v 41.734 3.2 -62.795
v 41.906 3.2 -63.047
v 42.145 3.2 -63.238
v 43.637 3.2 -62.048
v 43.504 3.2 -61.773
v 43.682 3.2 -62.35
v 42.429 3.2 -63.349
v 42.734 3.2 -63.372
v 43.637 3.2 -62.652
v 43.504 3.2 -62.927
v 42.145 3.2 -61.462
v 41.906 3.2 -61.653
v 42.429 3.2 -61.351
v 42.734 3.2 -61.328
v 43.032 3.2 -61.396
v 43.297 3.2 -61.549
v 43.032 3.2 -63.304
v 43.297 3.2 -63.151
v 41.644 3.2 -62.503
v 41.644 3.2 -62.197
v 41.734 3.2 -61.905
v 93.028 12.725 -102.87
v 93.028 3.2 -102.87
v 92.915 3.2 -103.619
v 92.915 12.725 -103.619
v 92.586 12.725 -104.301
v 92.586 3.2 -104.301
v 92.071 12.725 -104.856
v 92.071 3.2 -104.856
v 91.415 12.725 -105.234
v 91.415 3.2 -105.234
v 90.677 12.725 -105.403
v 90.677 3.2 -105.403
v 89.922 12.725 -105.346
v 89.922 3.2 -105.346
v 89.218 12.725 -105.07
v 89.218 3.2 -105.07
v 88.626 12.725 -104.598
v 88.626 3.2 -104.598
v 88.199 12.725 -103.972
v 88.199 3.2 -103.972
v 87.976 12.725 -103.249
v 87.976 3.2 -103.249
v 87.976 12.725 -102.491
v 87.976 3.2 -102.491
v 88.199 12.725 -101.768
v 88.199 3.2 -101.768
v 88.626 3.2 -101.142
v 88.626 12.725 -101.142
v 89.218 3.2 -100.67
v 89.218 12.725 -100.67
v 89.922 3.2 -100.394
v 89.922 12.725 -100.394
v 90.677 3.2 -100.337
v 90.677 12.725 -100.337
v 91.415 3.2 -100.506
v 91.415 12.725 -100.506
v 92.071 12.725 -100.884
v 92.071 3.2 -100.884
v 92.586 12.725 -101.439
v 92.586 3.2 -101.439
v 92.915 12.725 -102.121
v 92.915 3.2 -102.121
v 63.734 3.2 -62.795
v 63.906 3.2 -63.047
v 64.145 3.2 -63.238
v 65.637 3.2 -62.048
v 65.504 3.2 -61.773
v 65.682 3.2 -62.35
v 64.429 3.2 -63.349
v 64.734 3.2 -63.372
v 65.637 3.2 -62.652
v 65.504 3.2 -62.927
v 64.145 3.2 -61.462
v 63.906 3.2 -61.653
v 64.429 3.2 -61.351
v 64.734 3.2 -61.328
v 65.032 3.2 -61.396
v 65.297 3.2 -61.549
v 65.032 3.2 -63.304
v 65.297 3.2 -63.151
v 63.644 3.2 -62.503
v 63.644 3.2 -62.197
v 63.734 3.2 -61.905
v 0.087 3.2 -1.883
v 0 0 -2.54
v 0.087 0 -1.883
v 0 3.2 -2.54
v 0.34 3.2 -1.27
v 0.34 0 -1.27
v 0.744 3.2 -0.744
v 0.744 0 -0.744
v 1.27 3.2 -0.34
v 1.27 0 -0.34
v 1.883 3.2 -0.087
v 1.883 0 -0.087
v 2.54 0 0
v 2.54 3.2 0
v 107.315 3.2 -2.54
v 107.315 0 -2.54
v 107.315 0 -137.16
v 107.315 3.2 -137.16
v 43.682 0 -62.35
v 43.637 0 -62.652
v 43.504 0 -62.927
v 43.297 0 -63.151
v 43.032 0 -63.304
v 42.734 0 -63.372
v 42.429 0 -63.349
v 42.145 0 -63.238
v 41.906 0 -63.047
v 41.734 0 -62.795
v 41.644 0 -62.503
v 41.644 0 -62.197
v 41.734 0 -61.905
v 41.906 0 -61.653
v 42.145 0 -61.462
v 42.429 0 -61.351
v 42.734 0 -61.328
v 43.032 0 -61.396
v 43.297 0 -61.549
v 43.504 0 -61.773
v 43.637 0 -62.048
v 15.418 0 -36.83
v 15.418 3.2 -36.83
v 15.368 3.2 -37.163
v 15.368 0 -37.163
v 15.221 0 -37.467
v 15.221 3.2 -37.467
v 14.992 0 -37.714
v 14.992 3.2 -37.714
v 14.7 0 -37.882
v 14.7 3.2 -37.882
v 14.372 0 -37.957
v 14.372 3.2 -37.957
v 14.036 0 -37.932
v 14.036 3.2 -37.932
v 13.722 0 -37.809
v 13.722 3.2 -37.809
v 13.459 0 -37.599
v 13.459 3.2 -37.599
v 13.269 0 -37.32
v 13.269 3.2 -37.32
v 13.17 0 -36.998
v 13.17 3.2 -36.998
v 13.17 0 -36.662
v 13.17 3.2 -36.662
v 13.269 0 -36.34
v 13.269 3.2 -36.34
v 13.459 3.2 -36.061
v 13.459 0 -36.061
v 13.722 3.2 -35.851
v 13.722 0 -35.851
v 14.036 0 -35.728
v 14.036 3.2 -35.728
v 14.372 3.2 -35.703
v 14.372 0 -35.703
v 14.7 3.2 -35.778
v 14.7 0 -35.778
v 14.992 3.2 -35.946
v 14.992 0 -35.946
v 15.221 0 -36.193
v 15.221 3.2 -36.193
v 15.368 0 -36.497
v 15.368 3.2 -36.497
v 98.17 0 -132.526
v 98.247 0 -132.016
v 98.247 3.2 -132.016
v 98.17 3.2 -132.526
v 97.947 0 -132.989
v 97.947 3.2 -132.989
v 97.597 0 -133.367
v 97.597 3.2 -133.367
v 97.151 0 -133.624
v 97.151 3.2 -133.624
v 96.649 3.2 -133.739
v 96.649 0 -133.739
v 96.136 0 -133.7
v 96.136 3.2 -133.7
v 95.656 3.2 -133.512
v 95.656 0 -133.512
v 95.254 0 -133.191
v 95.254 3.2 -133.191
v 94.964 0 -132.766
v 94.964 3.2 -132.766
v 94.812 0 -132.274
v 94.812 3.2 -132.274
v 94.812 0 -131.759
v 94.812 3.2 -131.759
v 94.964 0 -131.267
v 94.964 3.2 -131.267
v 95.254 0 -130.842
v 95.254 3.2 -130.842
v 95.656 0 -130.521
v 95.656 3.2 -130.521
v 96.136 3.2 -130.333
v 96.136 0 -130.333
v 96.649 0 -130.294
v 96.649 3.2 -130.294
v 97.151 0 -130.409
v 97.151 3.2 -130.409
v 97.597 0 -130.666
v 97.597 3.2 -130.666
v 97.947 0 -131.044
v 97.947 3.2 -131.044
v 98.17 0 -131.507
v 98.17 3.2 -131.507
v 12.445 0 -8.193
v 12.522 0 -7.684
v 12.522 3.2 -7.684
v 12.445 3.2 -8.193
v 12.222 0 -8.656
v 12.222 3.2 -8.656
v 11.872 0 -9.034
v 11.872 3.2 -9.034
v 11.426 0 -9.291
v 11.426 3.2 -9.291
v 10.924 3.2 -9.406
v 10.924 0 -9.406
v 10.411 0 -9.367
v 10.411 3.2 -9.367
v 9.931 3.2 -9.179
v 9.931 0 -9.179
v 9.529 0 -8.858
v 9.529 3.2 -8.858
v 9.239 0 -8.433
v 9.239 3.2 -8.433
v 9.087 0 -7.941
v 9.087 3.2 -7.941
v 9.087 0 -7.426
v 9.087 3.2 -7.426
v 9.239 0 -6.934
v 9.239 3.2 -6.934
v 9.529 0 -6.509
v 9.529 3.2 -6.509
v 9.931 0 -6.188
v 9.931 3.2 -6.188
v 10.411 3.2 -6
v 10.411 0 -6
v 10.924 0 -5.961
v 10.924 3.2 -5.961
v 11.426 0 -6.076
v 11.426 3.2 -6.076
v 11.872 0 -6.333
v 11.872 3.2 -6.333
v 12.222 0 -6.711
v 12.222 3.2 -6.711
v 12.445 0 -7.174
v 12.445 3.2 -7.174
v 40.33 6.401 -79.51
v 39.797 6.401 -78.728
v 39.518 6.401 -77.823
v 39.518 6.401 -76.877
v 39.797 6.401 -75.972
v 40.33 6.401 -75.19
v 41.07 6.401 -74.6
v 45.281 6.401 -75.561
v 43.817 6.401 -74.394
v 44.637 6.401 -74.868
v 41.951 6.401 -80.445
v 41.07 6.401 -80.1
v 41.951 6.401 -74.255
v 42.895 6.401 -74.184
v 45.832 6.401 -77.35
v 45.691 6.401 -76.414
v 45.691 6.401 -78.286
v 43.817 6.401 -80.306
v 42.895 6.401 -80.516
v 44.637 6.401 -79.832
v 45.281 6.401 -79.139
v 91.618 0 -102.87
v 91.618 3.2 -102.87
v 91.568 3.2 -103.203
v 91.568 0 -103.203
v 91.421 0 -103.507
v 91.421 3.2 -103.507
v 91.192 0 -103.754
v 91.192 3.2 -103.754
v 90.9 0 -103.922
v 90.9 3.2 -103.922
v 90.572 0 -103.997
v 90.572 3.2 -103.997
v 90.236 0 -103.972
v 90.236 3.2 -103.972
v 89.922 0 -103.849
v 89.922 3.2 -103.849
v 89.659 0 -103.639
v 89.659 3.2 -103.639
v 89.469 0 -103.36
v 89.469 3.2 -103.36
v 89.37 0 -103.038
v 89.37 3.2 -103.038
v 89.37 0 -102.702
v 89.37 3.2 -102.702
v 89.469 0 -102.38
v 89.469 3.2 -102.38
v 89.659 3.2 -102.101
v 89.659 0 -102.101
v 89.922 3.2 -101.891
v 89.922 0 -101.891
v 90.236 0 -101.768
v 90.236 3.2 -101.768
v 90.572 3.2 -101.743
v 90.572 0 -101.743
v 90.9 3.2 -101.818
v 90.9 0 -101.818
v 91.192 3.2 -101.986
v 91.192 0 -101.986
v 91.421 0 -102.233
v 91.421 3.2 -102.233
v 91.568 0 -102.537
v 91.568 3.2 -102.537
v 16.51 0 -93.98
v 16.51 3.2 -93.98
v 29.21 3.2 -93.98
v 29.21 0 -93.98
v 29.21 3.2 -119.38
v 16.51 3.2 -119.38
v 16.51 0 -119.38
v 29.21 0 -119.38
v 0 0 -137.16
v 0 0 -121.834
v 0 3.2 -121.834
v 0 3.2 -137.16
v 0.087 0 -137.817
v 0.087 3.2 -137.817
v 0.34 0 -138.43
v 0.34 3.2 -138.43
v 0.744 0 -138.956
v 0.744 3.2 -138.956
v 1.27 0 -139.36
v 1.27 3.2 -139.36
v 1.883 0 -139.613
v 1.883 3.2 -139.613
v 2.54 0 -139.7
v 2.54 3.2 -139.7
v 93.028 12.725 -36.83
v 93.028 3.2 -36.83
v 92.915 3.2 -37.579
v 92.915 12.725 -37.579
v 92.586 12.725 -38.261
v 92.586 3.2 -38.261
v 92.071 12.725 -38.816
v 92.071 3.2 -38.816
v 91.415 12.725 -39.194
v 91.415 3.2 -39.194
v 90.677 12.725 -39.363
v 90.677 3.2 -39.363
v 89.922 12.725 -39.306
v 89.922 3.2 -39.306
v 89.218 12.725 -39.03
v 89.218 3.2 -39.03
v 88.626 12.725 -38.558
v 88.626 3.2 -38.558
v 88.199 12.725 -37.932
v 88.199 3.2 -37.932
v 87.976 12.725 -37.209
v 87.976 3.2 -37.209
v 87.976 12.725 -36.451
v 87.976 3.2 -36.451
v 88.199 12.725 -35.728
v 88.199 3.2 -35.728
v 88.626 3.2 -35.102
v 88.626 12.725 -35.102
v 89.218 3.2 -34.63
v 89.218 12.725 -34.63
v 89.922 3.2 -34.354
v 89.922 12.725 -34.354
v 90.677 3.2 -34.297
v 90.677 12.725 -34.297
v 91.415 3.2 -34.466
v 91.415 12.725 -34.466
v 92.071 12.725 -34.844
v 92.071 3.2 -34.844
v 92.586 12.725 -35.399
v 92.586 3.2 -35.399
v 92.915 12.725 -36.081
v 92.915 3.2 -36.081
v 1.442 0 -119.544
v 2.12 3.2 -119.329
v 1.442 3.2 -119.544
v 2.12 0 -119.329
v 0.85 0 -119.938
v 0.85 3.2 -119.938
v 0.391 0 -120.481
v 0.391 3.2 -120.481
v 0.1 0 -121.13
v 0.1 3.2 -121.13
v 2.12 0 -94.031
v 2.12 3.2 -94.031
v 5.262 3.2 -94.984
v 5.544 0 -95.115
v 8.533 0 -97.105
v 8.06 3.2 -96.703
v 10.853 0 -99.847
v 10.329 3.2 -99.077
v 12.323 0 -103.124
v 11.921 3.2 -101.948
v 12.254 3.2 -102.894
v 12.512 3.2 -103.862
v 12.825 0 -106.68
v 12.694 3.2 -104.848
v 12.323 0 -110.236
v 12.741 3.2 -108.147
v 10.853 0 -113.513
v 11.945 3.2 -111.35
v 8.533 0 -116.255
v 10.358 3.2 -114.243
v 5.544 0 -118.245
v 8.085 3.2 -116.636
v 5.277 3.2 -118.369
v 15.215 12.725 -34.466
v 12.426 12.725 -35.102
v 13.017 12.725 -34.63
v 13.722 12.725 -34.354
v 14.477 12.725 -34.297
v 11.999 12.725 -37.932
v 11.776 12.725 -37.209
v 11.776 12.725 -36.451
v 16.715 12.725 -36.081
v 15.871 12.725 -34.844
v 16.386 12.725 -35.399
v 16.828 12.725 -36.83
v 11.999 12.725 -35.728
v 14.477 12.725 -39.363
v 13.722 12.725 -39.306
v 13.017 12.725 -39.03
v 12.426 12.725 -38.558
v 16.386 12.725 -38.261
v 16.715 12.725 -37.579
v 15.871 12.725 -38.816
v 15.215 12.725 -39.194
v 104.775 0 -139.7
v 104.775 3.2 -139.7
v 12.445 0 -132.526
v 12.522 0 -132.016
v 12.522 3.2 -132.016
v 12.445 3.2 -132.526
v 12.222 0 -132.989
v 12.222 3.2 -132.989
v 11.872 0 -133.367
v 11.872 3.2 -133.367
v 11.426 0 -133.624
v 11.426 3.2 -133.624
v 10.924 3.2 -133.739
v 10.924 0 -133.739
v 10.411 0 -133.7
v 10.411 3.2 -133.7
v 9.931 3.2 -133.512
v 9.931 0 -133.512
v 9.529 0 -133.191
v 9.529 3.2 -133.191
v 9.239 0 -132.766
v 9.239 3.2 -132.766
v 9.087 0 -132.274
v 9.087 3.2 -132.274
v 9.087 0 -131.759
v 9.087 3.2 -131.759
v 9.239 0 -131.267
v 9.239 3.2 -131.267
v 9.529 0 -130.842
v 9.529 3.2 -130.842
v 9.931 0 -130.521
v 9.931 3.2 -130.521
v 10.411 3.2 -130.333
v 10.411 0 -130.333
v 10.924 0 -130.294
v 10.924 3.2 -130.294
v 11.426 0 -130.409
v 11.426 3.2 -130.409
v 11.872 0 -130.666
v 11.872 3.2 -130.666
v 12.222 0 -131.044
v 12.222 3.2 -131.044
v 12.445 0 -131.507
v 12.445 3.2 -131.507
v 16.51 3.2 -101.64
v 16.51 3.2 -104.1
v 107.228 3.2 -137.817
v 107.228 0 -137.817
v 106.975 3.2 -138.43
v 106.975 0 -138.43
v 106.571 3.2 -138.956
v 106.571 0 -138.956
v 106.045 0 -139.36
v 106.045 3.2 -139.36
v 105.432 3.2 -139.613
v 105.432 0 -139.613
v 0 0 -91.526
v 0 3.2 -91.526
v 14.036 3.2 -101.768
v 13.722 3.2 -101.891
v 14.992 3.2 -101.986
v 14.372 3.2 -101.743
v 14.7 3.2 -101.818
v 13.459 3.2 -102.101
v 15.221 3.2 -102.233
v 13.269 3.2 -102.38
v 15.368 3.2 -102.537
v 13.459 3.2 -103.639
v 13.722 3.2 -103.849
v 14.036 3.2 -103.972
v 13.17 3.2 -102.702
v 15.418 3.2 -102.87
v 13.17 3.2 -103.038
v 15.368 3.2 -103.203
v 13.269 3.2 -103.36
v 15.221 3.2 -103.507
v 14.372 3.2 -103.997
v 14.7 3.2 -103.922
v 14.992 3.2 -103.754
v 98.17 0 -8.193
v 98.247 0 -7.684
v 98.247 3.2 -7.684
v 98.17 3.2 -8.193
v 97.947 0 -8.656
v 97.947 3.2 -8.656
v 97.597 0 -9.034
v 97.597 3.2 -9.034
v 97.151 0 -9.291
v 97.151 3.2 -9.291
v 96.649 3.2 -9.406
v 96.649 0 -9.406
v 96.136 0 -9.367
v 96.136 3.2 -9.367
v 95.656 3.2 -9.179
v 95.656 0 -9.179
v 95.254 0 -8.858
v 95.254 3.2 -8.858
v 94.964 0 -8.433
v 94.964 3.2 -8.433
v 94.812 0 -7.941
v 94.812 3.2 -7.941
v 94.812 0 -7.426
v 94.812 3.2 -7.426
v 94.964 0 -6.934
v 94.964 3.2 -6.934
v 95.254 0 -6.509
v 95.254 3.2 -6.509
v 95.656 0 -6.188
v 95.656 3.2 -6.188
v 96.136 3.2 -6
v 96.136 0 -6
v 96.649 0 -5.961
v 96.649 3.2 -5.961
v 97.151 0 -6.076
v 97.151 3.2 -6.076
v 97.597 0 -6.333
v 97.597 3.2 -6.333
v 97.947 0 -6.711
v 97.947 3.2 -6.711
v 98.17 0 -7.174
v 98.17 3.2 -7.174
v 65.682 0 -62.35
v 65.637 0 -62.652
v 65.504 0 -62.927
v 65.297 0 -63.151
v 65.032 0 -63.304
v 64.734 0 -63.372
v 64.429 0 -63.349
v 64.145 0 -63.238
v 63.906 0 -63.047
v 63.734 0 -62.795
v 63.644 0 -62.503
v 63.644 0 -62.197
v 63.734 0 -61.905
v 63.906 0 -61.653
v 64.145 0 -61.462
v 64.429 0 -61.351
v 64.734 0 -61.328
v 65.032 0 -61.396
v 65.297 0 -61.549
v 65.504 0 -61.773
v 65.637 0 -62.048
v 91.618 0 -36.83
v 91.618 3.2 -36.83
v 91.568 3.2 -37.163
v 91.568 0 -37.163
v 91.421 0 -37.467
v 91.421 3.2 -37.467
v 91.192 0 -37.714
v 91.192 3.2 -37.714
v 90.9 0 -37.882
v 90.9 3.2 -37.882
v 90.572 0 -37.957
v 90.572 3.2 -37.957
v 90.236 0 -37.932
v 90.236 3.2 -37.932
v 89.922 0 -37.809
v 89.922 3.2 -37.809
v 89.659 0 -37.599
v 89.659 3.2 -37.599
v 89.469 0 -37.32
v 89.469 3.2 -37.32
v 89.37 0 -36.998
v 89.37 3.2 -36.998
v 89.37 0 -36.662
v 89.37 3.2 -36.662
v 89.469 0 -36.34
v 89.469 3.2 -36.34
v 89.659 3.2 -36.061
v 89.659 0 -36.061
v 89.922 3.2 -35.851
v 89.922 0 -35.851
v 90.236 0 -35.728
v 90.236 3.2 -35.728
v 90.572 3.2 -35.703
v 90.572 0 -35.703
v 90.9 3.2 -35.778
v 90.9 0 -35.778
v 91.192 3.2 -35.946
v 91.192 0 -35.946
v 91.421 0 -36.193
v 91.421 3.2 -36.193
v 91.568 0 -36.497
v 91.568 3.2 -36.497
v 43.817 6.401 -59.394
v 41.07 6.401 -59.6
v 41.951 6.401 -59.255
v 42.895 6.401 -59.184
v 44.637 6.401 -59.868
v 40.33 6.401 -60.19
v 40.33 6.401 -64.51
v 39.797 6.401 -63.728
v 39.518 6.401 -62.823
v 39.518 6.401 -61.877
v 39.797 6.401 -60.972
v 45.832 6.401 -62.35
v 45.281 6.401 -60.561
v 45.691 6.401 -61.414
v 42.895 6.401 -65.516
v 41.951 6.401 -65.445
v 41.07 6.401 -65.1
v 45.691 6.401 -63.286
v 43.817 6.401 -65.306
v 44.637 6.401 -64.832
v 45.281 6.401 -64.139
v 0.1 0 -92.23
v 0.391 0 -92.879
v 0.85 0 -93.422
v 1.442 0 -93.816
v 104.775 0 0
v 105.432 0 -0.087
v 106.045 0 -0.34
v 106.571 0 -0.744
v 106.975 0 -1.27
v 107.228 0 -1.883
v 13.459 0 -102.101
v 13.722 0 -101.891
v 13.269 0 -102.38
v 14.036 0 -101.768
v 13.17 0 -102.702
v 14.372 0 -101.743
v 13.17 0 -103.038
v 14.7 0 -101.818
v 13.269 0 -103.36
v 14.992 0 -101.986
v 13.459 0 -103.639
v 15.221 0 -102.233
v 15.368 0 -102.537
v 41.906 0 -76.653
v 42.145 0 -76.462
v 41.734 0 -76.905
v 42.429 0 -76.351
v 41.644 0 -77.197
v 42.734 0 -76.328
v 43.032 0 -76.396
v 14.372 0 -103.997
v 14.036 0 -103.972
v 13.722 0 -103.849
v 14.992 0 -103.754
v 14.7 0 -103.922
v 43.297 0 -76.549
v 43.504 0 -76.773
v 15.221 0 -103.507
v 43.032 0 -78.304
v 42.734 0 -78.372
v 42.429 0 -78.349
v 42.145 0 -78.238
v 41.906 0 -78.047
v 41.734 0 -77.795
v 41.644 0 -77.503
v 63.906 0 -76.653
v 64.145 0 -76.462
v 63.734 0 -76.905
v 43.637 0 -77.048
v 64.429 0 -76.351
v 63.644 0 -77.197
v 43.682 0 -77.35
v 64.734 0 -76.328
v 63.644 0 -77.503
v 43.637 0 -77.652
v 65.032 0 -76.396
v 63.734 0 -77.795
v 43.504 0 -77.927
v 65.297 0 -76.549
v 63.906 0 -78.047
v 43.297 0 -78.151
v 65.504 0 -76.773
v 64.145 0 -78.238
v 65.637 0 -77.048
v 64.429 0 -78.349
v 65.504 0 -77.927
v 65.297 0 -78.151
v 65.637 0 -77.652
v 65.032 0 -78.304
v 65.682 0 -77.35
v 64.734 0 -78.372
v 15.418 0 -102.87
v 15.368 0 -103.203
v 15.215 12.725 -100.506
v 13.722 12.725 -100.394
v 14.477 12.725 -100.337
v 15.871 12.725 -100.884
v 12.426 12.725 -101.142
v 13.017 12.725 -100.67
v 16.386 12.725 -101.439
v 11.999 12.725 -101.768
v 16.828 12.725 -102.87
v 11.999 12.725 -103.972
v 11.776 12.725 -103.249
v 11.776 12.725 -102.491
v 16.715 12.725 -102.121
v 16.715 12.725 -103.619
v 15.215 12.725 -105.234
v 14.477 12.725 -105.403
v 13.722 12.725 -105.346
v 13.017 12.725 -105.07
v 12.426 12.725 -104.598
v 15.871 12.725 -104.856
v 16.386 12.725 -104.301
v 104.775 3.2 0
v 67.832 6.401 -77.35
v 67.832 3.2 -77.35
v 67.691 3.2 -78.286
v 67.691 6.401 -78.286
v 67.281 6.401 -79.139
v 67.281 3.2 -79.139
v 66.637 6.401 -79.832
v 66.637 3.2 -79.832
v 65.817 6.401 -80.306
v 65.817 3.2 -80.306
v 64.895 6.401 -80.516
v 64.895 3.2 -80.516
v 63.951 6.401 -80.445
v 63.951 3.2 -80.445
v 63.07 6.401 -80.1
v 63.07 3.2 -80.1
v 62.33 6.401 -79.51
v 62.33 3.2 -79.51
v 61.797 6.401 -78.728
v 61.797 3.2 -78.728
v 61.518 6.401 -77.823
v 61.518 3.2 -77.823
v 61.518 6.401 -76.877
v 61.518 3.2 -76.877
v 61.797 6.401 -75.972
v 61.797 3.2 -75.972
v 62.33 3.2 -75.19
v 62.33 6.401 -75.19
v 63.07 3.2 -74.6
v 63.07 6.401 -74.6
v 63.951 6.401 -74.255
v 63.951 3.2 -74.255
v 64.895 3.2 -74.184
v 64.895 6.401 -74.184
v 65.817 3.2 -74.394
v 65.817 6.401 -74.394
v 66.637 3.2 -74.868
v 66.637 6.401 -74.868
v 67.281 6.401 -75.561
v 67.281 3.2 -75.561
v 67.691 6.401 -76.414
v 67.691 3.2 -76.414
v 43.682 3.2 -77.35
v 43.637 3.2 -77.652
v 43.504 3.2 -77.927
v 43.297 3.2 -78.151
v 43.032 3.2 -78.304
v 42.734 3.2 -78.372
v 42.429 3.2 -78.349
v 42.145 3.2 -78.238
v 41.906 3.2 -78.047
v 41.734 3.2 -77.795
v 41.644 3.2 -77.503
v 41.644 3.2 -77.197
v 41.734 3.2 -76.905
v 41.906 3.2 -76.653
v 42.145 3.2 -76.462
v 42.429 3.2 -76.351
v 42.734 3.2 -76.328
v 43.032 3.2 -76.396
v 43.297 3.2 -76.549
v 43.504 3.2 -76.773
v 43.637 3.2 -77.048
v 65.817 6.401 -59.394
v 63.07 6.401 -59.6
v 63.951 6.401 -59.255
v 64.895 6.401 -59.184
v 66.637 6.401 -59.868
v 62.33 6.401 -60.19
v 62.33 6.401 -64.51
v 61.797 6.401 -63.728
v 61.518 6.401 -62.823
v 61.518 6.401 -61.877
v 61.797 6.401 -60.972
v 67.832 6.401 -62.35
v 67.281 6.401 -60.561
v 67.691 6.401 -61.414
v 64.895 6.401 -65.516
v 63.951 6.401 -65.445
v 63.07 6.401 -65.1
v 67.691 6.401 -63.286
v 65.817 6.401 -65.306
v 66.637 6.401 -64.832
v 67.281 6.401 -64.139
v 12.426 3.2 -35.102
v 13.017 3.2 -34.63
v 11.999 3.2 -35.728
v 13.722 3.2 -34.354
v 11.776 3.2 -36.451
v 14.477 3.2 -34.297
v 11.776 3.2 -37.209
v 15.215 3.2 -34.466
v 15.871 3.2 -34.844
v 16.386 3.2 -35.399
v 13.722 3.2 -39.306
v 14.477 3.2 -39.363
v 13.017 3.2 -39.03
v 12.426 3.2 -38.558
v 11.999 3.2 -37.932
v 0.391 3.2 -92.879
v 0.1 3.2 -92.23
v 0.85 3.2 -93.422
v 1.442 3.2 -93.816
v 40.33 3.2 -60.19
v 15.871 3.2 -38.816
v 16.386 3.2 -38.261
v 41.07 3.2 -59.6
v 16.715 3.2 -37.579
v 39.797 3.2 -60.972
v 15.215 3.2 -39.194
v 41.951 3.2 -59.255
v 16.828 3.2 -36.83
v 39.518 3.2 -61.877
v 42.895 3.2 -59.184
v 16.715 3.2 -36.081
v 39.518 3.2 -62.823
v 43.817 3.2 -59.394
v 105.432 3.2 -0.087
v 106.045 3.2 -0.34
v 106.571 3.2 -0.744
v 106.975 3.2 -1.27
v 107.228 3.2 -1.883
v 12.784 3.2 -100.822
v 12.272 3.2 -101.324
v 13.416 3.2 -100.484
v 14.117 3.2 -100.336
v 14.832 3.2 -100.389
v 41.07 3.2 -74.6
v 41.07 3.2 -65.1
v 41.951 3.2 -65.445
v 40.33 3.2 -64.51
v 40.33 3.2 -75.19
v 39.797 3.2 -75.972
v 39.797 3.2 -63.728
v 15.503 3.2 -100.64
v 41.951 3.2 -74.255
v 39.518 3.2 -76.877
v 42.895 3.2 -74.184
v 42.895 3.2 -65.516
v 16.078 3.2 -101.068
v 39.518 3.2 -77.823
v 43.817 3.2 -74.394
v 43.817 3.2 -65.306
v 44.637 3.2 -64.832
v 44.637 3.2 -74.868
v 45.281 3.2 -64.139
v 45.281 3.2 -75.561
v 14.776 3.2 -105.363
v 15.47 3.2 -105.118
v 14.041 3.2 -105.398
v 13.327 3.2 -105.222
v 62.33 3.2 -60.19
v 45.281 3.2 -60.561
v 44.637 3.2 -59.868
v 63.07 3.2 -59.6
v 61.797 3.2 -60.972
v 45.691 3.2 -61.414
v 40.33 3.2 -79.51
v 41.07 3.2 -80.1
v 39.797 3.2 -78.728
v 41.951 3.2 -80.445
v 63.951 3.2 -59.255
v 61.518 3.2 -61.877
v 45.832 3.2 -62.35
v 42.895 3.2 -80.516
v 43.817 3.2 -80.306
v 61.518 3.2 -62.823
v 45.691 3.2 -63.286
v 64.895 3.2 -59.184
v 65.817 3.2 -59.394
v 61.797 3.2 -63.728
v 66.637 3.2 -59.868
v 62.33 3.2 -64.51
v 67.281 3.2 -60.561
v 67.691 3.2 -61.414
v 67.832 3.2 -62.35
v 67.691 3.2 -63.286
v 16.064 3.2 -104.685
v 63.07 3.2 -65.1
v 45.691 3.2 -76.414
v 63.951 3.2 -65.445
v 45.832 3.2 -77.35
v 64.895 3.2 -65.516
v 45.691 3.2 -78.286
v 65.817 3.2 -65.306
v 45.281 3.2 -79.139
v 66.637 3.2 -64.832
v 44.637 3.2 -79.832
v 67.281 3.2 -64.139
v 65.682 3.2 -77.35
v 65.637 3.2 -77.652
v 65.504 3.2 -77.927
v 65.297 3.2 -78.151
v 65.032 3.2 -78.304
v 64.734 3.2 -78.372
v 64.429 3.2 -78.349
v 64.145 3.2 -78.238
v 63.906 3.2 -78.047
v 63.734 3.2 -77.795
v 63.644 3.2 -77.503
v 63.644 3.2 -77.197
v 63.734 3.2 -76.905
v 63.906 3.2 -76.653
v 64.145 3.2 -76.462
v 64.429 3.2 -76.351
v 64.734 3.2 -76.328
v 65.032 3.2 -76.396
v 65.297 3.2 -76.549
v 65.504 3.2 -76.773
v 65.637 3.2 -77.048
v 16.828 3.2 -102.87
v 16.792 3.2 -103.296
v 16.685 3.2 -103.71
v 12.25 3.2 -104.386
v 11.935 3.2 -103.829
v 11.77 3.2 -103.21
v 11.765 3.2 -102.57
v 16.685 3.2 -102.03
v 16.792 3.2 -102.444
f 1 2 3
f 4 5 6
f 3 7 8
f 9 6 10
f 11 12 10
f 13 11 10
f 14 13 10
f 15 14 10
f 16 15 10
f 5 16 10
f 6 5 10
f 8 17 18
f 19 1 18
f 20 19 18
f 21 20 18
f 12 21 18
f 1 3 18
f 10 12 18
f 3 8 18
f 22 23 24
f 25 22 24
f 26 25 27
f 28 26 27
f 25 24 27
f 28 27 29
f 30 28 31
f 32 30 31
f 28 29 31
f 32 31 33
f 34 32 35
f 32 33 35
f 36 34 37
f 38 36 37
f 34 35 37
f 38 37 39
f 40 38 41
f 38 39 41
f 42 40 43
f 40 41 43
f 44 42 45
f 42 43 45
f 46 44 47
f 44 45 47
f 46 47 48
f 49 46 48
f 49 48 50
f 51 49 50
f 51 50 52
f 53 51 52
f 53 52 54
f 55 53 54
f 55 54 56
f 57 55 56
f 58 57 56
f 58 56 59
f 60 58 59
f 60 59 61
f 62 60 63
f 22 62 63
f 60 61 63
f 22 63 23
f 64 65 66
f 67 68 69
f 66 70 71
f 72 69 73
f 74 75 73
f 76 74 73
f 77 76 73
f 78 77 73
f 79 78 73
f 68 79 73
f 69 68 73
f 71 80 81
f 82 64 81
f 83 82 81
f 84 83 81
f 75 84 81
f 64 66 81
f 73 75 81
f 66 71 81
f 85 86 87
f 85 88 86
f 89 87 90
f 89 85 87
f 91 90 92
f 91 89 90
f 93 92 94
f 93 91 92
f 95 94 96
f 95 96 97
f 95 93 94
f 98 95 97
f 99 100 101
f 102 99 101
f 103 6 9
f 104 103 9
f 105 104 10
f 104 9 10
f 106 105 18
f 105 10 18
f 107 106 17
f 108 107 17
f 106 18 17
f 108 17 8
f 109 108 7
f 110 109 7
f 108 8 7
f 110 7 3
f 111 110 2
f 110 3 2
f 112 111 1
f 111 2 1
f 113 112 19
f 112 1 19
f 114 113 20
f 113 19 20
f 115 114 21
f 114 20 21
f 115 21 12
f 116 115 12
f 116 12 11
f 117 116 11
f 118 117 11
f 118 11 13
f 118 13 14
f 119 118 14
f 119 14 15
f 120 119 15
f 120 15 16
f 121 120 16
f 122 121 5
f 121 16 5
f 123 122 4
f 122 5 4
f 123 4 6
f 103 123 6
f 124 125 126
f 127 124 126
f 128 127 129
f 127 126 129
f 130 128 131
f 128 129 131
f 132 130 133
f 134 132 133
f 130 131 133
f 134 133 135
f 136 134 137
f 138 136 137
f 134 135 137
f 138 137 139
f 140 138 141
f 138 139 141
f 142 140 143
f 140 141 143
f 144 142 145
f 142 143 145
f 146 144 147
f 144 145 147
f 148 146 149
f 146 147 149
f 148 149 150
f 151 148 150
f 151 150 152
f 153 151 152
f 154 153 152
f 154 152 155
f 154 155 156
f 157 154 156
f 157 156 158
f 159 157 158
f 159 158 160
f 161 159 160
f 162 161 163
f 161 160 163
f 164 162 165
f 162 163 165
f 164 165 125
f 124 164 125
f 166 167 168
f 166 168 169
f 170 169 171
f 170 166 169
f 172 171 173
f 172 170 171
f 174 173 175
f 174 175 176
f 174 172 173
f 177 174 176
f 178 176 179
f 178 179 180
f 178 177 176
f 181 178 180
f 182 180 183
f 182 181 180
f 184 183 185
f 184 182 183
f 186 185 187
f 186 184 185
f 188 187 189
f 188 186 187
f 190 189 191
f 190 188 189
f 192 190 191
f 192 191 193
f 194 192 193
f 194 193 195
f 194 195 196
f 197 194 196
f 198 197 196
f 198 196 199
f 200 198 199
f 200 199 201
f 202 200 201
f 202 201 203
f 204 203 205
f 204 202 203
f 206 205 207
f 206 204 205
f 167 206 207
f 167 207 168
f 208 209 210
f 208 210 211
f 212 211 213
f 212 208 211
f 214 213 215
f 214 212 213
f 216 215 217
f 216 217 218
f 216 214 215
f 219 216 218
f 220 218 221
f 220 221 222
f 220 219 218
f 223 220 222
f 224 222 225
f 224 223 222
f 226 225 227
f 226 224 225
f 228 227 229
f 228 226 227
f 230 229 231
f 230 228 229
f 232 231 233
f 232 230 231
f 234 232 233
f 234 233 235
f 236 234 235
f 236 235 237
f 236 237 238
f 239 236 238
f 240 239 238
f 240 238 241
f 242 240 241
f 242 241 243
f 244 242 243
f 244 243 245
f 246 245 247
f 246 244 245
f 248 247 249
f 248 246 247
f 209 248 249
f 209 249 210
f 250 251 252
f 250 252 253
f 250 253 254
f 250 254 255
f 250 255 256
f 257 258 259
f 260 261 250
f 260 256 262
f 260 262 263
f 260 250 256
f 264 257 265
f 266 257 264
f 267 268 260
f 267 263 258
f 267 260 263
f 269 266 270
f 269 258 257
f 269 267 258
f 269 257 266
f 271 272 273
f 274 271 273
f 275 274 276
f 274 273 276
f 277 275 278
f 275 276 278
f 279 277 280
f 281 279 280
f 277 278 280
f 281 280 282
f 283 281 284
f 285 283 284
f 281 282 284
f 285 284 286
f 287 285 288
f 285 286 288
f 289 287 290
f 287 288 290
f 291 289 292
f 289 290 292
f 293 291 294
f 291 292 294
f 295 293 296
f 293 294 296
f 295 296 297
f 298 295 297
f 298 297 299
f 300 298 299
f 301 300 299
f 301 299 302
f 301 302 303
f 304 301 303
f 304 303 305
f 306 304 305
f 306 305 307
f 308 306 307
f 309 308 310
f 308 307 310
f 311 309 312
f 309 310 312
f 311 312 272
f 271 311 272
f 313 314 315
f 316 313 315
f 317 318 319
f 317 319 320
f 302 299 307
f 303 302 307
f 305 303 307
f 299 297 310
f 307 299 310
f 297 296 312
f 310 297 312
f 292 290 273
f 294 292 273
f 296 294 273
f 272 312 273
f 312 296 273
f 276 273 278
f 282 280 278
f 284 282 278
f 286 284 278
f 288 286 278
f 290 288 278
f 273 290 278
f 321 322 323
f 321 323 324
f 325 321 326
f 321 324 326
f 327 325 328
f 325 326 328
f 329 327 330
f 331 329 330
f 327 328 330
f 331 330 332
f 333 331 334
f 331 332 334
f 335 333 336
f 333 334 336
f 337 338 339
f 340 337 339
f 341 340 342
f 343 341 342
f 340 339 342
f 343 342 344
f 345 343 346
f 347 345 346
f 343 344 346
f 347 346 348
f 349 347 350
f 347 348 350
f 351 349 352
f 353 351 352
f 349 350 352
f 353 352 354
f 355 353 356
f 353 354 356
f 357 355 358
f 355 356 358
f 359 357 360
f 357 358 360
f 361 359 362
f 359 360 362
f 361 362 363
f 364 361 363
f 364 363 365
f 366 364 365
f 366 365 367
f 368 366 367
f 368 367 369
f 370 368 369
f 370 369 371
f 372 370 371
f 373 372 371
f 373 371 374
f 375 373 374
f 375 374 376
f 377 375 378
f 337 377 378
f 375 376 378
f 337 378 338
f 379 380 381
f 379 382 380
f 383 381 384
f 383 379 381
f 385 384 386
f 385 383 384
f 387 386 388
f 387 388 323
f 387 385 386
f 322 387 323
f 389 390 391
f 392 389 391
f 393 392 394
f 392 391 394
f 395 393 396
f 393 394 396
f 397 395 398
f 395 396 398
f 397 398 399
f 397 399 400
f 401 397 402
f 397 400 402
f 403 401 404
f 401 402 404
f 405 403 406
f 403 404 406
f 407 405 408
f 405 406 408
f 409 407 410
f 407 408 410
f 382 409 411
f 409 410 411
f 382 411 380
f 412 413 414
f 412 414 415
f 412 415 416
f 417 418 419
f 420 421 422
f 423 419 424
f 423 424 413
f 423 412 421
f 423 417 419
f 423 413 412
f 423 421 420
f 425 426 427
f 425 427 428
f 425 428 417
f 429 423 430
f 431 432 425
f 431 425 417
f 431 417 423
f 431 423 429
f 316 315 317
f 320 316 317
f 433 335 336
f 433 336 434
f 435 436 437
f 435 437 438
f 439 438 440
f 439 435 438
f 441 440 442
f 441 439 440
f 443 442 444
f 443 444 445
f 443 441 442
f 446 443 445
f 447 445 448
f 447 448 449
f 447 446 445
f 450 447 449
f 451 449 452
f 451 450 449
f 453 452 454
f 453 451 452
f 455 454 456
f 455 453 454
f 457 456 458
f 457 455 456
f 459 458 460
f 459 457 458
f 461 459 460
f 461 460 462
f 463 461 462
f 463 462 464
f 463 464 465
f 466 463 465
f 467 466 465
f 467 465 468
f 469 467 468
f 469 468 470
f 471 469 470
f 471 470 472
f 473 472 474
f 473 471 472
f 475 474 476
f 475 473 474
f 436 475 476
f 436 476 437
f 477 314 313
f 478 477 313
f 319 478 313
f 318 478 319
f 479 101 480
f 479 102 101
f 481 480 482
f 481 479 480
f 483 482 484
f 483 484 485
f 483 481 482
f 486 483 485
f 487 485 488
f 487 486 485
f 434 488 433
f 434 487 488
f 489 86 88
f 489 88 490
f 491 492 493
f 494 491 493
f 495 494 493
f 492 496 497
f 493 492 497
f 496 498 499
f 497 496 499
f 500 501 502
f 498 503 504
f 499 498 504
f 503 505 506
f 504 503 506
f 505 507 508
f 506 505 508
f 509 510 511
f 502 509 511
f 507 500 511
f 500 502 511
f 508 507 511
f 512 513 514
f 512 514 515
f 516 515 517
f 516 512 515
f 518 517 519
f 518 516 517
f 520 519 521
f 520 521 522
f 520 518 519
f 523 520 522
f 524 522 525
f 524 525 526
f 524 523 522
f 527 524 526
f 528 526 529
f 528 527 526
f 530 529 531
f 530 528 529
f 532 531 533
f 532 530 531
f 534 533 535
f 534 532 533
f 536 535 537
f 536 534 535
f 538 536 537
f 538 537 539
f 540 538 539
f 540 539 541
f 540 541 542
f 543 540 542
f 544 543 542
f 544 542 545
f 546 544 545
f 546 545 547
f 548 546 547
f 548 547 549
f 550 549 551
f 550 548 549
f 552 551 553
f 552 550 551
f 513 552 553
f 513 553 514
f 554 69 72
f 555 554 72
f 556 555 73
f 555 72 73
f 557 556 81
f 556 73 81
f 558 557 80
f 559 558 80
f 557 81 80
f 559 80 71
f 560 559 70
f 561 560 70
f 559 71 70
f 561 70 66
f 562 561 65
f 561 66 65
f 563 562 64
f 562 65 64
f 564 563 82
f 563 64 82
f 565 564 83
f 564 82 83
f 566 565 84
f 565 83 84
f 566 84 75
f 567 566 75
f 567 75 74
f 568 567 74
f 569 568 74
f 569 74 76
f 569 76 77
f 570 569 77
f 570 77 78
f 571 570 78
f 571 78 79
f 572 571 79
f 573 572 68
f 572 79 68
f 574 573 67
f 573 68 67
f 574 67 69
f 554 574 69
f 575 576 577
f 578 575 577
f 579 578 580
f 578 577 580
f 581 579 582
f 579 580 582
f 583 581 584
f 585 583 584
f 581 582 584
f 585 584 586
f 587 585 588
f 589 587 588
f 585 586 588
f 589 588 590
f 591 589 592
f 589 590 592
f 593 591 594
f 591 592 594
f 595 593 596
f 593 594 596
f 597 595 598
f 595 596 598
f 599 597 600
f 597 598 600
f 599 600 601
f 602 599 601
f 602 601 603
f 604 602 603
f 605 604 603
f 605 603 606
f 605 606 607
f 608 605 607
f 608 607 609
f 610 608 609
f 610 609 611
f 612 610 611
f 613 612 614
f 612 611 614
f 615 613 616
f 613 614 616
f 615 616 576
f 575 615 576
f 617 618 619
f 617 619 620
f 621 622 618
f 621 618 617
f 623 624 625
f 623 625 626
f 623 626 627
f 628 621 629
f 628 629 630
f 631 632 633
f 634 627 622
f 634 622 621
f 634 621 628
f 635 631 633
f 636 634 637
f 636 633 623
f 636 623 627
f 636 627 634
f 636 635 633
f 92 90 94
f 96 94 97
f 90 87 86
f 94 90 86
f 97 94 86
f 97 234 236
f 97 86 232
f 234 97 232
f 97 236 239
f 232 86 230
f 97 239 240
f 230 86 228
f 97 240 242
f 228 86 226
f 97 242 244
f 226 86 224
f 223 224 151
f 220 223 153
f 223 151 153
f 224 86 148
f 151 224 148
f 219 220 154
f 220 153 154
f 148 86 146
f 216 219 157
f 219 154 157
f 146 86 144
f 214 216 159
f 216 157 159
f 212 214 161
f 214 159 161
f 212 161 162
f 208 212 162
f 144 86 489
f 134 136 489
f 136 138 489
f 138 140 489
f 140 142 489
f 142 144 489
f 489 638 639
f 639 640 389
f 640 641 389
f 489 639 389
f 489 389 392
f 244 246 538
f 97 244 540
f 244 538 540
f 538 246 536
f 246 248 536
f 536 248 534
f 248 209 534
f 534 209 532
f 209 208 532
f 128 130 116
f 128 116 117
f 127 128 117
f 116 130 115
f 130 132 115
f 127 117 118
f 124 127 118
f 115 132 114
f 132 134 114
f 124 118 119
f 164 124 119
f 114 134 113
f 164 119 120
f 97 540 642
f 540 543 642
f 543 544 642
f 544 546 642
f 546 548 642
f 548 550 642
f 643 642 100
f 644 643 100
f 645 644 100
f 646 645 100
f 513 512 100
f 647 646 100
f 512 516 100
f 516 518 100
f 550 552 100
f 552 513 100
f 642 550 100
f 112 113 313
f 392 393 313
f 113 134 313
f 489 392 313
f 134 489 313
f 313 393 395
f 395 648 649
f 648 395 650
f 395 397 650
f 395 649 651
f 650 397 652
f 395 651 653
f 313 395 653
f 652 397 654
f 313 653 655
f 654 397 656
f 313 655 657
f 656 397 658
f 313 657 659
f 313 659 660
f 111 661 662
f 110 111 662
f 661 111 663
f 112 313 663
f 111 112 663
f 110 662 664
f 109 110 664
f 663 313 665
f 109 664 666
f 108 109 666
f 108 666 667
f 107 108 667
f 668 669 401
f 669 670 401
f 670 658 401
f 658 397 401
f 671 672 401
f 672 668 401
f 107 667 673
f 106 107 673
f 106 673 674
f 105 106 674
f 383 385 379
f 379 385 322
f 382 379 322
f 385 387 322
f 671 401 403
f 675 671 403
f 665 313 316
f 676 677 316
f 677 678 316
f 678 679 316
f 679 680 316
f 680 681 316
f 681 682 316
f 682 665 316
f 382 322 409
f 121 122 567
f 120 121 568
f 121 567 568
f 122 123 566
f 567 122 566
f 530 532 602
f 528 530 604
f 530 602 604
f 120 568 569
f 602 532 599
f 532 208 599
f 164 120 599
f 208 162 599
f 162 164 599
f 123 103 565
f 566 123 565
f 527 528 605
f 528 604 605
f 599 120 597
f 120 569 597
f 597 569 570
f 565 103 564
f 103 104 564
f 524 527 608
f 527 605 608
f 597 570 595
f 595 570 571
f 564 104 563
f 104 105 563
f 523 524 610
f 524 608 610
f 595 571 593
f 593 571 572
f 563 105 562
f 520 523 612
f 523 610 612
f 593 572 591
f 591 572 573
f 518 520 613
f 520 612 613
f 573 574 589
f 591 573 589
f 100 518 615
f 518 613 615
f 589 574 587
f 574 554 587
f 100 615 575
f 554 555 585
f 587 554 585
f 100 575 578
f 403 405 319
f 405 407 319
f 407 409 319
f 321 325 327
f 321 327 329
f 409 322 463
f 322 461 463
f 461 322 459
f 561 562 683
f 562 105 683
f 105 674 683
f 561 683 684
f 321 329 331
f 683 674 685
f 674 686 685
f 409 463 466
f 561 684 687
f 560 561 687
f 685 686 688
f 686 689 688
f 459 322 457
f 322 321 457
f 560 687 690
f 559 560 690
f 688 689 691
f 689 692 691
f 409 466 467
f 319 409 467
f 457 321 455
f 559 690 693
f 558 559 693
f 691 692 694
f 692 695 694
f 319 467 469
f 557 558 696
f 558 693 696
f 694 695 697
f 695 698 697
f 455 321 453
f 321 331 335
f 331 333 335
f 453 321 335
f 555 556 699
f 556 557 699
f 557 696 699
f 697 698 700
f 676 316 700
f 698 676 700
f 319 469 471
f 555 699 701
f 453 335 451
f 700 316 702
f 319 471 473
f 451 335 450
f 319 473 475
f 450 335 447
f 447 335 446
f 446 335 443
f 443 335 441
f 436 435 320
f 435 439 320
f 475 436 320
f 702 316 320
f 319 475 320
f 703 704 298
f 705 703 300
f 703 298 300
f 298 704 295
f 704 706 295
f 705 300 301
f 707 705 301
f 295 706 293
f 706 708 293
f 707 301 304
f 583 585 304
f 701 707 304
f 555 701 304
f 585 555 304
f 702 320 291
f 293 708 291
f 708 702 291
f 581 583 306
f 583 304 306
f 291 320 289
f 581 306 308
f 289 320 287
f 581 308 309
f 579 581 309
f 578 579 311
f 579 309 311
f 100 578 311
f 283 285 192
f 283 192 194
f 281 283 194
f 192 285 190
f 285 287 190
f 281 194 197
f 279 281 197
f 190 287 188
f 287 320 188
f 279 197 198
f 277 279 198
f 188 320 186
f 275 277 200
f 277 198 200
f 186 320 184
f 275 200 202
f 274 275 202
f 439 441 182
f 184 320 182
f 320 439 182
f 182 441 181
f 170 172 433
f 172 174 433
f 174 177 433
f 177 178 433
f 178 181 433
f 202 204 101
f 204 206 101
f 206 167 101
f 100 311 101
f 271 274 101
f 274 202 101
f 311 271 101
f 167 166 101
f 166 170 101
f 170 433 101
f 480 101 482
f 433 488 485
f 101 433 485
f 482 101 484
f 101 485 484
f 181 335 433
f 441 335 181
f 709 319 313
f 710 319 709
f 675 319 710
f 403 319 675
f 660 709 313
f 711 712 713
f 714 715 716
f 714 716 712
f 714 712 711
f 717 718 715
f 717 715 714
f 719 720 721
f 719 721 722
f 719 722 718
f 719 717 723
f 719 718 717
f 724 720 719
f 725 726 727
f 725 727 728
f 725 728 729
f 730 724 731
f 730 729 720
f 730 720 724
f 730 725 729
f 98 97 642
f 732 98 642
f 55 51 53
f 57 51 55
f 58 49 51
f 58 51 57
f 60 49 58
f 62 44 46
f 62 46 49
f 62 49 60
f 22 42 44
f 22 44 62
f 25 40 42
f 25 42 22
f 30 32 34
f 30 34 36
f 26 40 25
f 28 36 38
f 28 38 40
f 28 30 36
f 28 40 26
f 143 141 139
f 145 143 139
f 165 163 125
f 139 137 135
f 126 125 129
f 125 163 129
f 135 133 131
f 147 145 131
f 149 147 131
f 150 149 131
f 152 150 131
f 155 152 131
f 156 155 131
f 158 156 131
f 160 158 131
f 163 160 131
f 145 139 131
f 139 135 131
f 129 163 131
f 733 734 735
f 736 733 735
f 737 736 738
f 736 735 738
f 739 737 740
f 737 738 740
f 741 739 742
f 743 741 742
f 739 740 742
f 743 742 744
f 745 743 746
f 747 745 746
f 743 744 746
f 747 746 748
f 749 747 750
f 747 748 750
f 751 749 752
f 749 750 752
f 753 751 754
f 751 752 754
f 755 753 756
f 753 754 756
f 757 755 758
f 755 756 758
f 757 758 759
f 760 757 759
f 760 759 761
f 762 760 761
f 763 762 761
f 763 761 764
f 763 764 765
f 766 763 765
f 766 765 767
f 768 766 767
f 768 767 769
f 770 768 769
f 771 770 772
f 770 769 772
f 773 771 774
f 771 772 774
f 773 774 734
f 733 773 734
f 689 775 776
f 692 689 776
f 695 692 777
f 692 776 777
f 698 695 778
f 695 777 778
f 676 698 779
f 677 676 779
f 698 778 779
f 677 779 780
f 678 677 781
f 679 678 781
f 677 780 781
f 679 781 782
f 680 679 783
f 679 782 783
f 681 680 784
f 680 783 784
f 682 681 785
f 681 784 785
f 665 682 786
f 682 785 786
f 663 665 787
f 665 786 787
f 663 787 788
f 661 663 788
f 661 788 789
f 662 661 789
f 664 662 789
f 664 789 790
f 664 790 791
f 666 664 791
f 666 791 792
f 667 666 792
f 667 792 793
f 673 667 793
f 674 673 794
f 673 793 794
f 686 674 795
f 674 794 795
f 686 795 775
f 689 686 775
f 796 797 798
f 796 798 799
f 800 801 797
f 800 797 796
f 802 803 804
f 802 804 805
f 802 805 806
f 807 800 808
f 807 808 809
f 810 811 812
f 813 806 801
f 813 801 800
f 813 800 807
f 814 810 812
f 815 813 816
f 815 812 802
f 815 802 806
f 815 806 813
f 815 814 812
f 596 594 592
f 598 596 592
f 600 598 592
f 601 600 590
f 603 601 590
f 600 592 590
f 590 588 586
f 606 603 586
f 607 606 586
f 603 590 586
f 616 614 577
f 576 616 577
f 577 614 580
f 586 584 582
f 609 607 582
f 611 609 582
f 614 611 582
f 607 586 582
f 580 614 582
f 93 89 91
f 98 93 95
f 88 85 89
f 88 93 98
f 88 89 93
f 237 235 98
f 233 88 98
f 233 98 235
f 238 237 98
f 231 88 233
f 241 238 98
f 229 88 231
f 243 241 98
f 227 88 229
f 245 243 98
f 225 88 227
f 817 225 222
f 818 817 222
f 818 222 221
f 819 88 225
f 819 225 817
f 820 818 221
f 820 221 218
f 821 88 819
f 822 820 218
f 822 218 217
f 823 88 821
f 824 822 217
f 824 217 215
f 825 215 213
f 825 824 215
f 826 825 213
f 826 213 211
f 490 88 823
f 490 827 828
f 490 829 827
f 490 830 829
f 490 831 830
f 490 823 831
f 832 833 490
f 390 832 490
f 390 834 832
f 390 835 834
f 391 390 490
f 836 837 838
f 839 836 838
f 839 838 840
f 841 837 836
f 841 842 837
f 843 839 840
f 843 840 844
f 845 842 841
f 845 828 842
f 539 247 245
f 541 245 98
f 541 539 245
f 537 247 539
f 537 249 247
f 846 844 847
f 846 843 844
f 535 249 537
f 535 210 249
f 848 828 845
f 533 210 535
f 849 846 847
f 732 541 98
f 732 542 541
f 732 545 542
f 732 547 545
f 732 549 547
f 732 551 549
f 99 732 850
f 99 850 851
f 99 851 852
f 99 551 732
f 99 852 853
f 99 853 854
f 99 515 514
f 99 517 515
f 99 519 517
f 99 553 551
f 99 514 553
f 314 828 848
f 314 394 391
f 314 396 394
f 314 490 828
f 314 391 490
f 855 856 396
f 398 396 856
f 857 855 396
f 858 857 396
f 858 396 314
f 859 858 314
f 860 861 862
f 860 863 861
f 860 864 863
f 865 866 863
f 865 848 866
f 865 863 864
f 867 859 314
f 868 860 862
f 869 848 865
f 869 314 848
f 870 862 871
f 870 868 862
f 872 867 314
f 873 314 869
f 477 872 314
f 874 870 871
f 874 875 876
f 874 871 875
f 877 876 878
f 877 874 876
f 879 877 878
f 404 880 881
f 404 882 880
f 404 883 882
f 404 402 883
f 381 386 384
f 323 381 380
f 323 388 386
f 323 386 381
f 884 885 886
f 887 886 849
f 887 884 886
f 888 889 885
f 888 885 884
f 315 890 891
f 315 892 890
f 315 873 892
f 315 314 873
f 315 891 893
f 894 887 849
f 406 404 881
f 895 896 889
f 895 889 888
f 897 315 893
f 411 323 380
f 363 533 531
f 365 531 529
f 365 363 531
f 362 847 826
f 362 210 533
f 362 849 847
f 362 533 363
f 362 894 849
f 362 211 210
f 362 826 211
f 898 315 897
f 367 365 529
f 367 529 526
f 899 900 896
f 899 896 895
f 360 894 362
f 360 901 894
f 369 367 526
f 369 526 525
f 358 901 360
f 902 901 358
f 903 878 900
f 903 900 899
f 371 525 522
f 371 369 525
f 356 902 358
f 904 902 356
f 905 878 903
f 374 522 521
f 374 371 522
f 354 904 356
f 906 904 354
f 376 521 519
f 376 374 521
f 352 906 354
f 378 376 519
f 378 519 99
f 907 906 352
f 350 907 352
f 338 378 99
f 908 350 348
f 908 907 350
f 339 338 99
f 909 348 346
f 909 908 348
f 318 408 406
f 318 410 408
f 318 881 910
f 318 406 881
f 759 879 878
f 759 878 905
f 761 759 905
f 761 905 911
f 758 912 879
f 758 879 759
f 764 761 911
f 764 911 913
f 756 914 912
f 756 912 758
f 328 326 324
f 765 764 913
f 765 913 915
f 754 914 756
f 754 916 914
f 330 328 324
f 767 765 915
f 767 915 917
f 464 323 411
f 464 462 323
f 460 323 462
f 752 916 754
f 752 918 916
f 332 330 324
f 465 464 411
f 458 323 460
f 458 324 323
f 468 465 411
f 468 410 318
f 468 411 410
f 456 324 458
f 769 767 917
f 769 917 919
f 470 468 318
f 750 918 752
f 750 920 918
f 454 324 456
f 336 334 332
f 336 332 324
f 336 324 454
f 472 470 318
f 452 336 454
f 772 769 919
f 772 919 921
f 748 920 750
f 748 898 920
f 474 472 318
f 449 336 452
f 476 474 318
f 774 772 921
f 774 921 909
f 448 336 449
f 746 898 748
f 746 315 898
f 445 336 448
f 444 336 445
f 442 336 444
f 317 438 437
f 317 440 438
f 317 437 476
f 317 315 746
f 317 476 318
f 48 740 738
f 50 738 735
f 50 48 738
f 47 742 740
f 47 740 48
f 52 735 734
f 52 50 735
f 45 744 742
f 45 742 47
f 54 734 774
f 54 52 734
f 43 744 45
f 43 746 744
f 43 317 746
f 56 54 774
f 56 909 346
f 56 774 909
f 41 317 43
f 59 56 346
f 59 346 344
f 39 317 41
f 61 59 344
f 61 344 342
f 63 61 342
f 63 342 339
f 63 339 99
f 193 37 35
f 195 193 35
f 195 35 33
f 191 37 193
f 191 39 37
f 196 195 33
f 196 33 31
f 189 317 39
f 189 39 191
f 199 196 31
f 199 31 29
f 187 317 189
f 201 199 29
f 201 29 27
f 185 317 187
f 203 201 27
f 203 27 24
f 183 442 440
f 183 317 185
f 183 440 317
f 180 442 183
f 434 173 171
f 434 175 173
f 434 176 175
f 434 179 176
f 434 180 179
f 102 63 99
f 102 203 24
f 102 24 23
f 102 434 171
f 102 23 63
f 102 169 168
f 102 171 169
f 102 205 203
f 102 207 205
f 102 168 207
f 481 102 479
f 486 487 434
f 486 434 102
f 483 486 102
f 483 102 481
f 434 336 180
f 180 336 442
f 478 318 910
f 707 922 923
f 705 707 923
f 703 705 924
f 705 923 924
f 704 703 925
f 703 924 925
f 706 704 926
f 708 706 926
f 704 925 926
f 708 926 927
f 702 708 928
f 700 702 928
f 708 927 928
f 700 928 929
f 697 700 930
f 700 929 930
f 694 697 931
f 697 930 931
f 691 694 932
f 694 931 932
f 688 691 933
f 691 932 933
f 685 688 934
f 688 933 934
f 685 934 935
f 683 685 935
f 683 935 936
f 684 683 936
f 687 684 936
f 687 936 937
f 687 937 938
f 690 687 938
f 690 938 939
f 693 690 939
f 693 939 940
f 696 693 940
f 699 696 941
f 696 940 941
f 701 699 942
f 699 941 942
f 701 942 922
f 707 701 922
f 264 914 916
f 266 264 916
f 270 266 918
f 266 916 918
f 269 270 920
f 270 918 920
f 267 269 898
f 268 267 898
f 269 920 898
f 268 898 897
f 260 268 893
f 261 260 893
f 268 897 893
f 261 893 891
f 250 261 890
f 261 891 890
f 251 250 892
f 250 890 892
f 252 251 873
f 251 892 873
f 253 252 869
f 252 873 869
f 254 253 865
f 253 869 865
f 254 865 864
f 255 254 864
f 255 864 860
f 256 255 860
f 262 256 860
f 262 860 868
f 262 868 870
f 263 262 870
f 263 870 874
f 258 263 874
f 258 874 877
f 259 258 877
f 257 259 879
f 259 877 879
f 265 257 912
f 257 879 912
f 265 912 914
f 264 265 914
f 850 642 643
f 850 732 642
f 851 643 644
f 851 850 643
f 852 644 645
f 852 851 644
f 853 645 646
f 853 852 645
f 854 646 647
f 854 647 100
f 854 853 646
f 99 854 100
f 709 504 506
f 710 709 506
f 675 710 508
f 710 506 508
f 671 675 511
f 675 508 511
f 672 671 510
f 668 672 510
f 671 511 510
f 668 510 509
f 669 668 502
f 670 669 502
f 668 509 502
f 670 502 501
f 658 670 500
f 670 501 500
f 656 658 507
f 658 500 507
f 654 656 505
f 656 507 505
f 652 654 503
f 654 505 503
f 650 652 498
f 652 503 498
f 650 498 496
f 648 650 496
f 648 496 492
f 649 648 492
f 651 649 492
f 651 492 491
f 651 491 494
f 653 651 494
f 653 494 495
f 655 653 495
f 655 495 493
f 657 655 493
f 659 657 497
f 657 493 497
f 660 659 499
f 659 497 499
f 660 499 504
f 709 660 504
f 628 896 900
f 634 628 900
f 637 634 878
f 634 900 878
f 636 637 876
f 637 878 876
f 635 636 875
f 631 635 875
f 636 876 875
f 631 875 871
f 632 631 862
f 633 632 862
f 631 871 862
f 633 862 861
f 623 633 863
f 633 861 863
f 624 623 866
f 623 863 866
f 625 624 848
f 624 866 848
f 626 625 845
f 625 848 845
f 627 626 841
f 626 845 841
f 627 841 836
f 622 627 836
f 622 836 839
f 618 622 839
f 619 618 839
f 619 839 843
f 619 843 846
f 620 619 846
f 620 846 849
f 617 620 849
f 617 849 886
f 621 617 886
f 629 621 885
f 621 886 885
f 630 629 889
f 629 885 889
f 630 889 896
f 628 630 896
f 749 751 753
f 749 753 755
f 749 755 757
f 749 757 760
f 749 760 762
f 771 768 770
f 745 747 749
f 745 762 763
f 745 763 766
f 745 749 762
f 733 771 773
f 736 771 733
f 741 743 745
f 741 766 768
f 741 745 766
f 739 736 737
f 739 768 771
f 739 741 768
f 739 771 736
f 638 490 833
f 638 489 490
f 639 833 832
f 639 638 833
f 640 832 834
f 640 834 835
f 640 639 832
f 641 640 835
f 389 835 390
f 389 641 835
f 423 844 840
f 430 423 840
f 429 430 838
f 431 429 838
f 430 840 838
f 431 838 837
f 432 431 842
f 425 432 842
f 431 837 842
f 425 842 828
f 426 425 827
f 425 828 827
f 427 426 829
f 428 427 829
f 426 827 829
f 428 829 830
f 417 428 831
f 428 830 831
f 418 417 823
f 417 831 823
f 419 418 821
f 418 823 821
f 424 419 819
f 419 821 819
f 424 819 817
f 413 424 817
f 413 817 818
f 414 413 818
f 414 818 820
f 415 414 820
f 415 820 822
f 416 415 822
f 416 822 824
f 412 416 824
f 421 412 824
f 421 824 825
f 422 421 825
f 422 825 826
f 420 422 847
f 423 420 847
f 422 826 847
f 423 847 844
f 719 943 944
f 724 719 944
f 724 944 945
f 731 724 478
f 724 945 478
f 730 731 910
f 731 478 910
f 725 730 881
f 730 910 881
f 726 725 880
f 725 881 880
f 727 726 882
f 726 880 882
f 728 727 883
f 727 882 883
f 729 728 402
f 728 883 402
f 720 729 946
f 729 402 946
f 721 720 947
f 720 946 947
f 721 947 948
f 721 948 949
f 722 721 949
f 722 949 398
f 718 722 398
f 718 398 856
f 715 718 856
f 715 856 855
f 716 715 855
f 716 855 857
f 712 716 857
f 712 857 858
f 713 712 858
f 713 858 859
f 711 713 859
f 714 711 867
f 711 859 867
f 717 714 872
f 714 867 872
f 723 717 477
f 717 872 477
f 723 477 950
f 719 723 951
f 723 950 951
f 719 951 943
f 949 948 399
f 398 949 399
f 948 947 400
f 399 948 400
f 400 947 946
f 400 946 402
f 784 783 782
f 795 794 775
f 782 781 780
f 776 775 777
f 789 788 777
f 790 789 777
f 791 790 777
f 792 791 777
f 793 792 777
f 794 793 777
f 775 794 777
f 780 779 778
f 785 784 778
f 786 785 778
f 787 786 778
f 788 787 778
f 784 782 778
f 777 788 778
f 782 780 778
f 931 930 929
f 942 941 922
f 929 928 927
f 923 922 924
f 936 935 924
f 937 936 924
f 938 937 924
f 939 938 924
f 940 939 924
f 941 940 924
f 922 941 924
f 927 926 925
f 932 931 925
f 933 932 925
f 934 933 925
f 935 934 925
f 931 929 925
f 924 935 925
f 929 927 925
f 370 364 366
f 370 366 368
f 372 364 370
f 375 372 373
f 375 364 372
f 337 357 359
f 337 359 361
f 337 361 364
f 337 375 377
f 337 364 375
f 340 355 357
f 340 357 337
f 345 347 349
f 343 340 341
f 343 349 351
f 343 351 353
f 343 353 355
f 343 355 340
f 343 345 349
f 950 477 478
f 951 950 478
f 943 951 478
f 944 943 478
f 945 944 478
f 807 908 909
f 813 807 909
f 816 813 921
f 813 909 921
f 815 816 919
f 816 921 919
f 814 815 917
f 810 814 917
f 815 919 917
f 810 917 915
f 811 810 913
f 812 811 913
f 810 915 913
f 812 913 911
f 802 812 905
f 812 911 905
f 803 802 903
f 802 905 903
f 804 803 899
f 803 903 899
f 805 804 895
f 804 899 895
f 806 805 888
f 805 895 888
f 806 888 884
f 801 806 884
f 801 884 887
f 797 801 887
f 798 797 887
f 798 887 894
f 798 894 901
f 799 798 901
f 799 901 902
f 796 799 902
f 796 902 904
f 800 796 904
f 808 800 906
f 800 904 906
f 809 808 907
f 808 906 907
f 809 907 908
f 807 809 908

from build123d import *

# Parameters (mm, degrees)
SKETCH1_W           = 107.315
SKETCH1_H           = 139.7
SKETCH1_R           = 1.7272
BOSS_EXTRUDE1_DEPTH = 3.2004
SKETCH2_W           = 12.7
SKETCH2_H           = 25.4
CUT_EXTRUDE1_DEPTH  = 3.2004
SKETCH3_R           = 1.1303
CUT_EXTRUDE2_DEPTH  = 3.2004
FILLET1_R           = 2.54
SKETCH4_R           = 1.02489
CUT_EXTRUDE3_DEPTH  = 3.2004
SKETCH5_R           = 2.54
BOSS_EXTRUDE2_DEPTH = 9.525
SKETCH6_R           = 3.175
BOSS_EXTRUDE3_DEPTH = 3.2004


with BuildPart() as part:
    # Sketch1 → Boss-Extrude1 (new body)
    with BuildSketch(Plane(origin=(0, 0, 0), x_dir=(1, 0, 0), z_dir=(0, 1, 0))):
        with Locations((53.6575, 69.85)):
            Rectangle(SKETCH1_W, SKETCH1_H)
        with Locations((10.795, 132.0165)):
            Circle(SKETCH1_R, mode=Mode.SUBTRACT)
        with Locations((96.52, 132.0165)):
            Circle(SKETCH1_R, mode=Mode.SUBTRACT)
        with Locations((96.52, 7.6835)):
            Circle(SKETCH1_R, mode=Mode.SUBTRACT)
        with Locations((10.795, 7.6835)):
            Circle(SKETCH1_R, mode=Mode.SUBTRACT)
    extrude(amount=BOSS_EXTRUDE1_DEPTH)

    # Sketch2 → Cut-Extrude1 (cut)
    with BuildSketch(Plane(origin=(0, 3.2004, 0), x_dir=(1, 0, 0), z_dir=(0, 1, 0))):
        with Locations((22.86, 106.68)):
            Rectangle(SKETCH2_W, SKETCH2_H)
        with BuildLine():
            Line((0, 119.505365836), (0, 93.854634164))
            ThreePointArc((0, 93.854634164), (12.825365836, 106.68), (0, 119.505365836))
        make_face()
    extrude(amount=-CUT_EXTRUDE1_DEPTH, mode=Mode.SUBTRACT)

    # Sketch3 → Cut-Extrude2 (cut)
    with BuildSketch(Plane(origin=(0, 3.2004, 0), x_dir=(1, 0, 0), z_dir=(0, 1, 0))):
        with Locations((90.4875, 102.87)):
            Circle(SKETCH3_R)
        with Locations((90.4875, 36.83)):
            Circle(SKETCH3_R)
        with Locations((14.2875, 36.83)):
            Circle(SKETCH3_R)
        with Locations((14.2875, 102.87)):
            Circle(SKETCH3_R)
    extrude(amount=-CUT_EXTRUDE2_DEPTH, mode=Mode.SUBTRACT)

    # Fillet1
    fillet1_edges = [part.edges().sort_by_distance(p)[0] for p in [
        (0, 1.6002, -119.505365836),
        (0, 1.6002, -93.854634164),
        (0, 1.6002, -139.7),
        (107.315, 1.6002, -139.7),
        (107.315, 1.6002, 0),
        (0, 1.6002, 0),
    ]]
    fillet(fillet1_edges, radius=FILLET1_R)

    # Sketch4 → Cut-Extrude3 (cut)
    with BuildSketch(Plane(origin=(0, 3.2004, 0), x_dir=(1, 0, 0), z_dir=(0, 1, 0))):
        with Locations((64.6575, 77.35)):
            Circle(SKETCH4_R)
        with Locations((64.6575, 62.35)):
            Circle(SKETCH4_R)
        with Locations((42.6575, 77.35)):
            Circle(SKETCH4_R)
        with Locations((42.6575, 62.35)):
            Circle(SKETCH4_R)
    extrude(amount=-CUT_EXTRUDE3_DEPTH, mode=Mode.SUBTRACT)

    # Sketch5 → Boss-Extrude2 (add)
    with BuildSketch(Plane(origin=(0, 3.2004, 0), x_dir=(1, 0, 0), z_dir=(0, 1, 0))):
        with Locations((90.4875, 102.87)):
            Circle(SKETCH5_R)
        with Locations((90.4875, 36.83)):
            Circle(SKETCH5_R)
        with Locations((14.2875, 36.83)):
            Circle(SKETCH5_R)
        with Locations((14.2875, 102.87)):
            Circle(SKETCH5_R)
    extrude(amount=BOSS_EXTRUDE2_DEPTH)

    # Sketch6 → Boss-Extrude3 (add)
    with BuildSketch(Plane(origin=(0, 3.2004, 0), x_dir=(1, 0, 0), z_dir=(0, 1, 0))):
        with Locations((64.6575, 77.35)):
            Circle(SKETCH6_R)
        with Locations((64.6575, 62.35)):
            Circle(SKETCH6_R)
        with Locations((42.6575, 62.35)):
            Circle(SKETCH6_R)
        with Locations((42.6575, 77.35)):
            Circle(SKETCH6_R)
    extrude(amount=BOSS_EXTRUDE3_DEPTH)


solid = part.part
